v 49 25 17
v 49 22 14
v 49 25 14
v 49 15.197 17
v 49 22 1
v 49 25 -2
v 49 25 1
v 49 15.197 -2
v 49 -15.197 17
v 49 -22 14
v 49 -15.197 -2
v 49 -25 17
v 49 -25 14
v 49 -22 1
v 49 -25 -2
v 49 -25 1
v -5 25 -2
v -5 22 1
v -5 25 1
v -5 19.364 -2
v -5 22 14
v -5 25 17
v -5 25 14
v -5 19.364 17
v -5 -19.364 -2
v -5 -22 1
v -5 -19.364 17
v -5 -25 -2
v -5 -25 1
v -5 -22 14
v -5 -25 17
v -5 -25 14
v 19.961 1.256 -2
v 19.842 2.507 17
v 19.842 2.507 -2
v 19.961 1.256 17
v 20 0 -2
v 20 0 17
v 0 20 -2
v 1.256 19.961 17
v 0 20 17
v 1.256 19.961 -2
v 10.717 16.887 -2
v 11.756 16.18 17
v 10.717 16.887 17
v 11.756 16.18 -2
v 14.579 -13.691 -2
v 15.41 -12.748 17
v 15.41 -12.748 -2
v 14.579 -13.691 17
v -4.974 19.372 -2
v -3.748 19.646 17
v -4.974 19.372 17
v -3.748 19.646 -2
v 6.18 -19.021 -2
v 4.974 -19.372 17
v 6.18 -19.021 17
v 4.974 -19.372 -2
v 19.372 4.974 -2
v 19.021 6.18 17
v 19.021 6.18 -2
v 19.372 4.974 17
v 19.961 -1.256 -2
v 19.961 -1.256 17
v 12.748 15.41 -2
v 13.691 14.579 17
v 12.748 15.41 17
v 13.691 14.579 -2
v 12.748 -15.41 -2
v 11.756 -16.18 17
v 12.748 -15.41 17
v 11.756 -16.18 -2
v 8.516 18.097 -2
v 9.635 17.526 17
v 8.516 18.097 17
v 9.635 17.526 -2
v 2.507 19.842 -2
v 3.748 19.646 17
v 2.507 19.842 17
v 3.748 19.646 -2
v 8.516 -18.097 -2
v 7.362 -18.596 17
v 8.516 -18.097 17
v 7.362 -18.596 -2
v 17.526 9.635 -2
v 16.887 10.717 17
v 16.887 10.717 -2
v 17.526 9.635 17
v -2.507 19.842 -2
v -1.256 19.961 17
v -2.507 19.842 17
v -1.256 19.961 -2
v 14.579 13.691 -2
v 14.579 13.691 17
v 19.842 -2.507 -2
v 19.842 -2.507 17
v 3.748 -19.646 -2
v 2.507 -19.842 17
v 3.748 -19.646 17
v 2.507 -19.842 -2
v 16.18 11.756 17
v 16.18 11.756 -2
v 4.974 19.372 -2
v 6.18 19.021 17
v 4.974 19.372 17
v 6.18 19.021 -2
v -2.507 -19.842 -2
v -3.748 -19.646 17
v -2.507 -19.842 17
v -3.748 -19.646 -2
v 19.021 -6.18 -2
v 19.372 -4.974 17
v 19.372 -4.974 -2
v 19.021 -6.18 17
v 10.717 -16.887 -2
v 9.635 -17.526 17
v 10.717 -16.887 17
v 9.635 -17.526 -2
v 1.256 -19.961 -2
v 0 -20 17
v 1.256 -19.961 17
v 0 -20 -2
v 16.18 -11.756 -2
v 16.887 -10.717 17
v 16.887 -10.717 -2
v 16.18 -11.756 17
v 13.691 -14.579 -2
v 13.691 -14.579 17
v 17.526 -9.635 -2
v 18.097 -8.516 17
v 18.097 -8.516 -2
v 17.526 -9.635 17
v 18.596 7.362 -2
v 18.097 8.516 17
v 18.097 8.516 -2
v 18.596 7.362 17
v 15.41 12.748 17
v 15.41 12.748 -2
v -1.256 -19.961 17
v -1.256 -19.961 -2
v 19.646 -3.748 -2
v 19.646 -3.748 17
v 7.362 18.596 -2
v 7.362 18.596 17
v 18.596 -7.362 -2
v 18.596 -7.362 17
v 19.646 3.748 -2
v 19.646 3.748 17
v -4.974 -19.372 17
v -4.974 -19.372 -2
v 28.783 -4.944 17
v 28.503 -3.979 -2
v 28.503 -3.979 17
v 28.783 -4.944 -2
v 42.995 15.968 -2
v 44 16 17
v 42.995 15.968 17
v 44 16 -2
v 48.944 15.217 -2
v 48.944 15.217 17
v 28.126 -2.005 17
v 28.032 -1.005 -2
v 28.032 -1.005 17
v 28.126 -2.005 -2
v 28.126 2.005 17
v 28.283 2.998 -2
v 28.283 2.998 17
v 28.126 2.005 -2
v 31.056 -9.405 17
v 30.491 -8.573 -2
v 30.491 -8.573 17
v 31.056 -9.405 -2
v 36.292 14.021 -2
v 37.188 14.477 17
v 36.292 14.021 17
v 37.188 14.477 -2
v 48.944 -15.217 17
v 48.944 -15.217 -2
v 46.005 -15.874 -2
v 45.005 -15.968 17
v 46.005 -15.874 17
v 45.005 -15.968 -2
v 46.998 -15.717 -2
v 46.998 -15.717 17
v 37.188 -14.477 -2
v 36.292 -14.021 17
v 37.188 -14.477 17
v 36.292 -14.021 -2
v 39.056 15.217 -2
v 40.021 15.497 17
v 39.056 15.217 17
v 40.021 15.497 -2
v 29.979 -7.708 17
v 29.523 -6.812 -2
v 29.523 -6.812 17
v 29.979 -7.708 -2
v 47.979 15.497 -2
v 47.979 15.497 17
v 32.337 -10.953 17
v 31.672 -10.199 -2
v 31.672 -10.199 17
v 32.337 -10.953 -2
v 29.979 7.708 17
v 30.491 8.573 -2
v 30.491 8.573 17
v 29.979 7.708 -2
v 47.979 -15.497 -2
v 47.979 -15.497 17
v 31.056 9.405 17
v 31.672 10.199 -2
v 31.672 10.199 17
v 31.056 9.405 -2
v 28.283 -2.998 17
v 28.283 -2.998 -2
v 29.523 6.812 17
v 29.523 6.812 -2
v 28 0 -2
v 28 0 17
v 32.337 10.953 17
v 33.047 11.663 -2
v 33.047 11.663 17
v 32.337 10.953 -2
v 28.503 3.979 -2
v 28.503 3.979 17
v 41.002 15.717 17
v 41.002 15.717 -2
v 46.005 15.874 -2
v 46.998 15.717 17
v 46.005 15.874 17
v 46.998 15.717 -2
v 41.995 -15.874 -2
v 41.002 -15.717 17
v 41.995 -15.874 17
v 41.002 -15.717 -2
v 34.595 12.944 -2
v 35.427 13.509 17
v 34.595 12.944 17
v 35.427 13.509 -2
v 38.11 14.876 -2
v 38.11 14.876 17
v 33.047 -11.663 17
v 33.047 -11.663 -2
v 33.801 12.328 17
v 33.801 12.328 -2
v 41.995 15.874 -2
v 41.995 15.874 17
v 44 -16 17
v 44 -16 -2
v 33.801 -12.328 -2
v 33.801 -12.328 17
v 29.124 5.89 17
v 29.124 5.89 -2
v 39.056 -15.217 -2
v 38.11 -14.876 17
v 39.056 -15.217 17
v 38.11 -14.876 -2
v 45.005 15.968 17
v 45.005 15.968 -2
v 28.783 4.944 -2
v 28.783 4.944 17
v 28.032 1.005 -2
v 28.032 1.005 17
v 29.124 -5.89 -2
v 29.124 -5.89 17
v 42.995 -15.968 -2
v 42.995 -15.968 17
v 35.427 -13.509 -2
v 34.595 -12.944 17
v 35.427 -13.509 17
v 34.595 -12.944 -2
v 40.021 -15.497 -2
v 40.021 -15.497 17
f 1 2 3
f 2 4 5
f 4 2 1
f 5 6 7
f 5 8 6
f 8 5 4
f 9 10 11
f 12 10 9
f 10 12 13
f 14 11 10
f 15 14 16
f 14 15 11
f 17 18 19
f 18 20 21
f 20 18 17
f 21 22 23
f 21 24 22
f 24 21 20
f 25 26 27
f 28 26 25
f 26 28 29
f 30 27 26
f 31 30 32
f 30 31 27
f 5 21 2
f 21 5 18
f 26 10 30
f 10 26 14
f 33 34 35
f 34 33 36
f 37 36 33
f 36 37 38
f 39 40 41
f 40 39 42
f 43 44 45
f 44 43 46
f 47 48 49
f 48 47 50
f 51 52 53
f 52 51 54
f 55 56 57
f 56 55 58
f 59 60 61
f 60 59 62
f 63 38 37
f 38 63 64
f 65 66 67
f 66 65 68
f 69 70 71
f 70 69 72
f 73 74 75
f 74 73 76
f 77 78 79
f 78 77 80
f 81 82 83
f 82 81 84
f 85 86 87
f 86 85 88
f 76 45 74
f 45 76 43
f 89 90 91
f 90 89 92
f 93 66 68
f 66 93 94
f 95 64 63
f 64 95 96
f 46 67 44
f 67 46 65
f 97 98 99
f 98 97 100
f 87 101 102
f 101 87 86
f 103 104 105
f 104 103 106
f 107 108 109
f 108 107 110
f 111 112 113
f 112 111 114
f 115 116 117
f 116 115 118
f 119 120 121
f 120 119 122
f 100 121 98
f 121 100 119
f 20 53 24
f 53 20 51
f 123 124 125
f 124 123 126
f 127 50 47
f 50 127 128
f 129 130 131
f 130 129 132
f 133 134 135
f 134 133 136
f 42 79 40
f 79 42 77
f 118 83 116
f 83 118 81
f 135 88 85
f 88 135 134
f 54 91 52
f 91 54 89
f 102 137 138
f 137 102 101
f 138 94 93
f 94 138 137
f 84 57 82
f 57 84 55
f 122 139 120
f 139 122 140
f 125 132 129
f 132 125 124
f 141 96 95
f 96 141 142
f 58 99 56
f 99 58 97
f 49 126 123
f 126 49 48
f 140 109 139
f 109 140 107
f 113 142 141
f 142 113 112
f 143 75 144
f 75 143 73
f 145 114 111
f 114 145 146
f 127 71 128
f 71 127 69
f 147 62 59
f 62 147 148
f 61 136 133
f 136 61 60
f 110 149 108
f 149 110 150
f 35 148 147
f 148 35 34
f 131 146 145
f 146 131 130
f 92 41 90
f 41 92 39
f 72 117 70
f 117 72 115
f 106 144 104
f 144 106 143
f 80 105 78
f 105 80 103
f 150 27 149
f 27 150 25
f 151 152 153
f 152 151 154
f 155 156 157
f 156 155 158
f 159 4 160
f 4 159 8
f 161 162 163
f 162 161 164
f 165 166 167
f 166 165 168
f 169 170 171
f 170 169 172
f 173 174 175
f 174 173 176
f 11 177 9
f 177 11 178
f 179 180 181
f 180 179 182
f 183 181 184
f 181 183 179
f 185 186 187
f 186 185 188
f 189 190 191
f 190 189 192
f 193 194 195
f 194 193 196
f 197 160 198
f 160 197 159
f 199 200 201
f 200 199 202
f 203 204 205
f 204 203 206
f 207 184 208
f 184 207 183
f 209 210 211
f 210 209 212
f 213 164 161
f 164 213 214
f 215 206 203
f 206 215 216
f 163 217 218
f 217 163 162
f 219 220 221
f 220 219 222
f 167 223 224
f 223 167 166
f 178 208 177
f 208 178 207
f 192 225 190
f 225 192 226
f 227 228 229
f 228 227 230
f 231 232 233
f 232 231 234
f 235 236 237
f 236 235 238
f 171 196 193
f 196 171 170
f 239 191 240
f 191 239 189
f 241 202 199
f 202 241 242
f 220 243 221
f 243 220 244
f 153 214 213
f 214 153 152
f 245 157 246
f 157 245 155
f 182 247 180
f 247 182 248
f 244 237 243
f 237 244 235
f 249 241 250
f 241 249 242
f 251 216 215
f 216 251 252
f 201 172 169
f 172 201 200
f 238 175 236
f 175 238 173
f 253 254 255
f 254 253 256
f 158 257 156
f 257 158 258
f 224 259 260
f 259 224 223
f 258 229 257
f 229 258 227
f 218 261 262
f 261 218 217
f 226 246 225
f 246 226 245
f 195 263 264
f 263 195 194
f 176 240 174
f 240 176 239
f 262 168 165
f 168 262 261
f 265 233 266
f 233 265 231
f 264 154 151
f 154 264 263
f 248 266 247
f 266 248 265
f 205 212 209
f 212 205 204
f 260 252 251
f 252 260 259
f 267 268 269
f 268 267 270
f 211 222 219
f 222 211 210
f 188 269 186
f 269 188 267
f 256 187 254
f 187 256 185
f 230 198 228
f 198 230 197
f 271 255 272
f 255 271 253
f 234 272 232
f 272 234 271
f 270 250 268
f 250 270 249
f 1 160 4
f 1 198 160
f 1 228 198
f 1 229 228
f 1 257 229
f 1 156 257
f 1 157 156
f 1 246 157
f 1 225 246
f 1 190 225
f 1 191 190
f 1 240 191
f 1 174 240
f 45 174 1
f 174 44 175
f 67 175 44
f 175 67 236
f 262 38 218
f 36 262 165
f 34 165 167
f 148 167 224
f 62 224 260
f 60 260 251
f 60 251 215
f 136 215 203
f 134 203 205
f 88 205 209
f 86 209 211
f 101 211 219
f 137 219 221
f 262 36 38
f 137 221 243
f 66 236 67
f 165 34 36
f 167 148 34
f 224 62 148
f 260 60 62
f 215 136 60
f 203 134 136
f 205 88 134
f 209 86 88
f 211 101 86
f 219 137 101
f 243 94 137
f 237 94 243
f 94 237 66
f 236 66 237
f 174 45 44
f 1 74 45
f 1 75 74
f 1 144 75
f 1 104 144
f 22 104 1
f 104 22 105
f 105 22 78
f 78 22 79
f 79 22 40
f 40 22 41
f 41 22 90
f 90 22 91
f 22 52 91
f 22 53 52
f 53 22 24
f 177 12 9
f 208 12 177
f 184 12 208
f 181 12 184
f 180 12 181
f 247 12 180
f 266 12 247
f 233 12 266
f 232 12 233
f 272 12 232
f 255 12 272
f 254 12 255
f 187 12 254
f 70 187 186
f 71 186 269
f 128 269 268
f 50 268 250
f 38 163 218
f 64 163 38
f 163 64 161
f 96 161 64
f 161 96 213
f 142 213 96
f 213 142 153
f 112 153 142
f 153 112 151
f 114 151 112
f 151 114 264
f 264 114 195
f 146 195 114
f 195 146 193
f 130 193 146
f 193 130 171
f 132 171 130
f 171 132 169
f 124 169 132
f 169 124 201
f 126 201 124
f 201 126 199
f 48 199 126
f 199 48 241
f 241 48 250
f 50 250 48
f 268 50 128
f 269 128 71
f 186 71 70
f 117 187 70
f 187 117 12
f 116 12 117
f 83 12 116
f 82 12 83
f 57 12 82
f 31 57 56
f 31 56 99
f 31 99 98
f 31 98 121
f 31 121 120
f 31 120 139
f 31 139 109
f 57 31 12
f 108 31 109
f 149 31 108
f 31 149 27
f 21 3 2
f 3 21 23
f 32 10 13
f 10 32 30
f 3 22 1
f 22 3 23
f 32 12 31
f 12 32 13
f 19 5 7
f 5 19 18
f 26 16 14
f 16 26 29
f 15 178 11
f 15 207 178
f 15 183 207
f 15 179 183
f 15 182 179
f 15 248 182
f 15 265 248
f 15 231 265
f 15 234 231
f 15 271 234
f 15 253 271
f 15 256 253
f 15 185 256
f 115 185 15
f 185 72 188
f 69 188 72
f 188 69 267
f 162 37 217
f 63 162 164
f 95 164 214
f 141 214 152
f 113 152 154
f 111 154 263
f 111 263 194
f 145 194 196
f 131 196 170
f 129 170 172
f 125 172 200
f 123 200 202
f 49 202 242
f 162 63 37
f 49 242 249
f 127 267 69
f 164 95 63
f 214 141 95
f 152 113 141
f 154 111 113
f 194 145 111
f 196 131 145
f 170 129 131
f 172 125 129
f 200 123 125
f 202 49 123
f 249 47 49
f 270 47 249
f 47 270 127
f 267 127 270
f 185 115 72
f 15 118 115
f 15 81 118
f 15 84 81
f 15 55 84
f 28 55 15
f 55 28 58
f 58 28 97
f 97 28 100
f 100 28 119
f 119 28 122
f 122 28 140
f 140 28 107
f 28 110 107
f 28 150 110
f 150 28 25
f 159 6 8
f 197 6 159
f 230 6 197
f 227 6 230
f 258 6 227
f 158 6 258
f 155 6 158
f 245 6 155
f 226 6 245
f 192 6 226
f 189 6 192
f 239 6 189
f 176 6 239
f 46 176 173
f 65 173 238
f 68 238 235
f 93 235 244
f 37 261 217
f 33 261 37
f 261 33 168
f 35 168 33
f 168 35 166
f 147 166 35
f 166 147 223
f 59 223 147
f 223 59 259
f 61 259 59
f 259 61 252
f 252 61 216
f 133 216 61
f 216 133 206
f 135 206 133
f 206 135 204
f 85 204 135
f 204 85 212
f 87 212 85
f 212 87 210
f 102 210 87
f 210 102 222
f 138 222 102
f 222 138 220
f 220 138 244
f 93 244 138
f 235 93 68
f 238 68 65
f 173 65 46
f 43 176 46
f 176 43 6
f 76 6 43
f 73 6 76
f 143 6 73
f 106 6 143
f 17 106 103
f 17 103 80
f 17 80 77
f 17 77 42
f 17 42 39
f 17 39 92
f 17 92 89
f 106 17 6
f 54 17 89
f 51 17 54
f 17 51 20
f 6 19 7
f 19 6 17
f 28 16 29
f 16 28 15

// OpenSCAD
$fn=100;

//tripod radii (R1) are 17.5, 19, 21
//PVC radii (R2) are 16.5 (1" pipe), 20 (fitting)
//3/4 GI - 13.5

//cube offset (CuO) = 5
//center offset (CeO) = 19 + 20 + 10 = 49
//cube length (CL) = CeO + CuO*2


R1 = 20; 
R2 = 16;
CuO = 5;
CeO = CuO+R1+R2+3;
CL = CeO + CuO*2;

difference(){
    #translate([-CuO,-CeO/2,0]) cube([CL,CeO,15]);
    translate([0,0,-1]) cylinder(20,R1,R1);
    translate([CeO,0,-1])cylinder(20,R2,R2);
    }

translate([0,0,14]) difference(){
    translate([-CuO,(-CeO/2)-3,0]) cube([CL,CeO+6,3]);
    translate([0,0,-1]) cylinder(20,R1,R1);
    translate([CeO,0,-1])cylinder(20,R2,R2);
    }

translate([0,0,-2])difference(){
    translate([-CuO,(-CeO/2)-3,0]) cube([CL,CeO+6,3]);
    translate([0,0,-1]) cylinder(20,R1,R1);
    translate([CeO,0,-1])cylinder(20,R2,R2);
    }
